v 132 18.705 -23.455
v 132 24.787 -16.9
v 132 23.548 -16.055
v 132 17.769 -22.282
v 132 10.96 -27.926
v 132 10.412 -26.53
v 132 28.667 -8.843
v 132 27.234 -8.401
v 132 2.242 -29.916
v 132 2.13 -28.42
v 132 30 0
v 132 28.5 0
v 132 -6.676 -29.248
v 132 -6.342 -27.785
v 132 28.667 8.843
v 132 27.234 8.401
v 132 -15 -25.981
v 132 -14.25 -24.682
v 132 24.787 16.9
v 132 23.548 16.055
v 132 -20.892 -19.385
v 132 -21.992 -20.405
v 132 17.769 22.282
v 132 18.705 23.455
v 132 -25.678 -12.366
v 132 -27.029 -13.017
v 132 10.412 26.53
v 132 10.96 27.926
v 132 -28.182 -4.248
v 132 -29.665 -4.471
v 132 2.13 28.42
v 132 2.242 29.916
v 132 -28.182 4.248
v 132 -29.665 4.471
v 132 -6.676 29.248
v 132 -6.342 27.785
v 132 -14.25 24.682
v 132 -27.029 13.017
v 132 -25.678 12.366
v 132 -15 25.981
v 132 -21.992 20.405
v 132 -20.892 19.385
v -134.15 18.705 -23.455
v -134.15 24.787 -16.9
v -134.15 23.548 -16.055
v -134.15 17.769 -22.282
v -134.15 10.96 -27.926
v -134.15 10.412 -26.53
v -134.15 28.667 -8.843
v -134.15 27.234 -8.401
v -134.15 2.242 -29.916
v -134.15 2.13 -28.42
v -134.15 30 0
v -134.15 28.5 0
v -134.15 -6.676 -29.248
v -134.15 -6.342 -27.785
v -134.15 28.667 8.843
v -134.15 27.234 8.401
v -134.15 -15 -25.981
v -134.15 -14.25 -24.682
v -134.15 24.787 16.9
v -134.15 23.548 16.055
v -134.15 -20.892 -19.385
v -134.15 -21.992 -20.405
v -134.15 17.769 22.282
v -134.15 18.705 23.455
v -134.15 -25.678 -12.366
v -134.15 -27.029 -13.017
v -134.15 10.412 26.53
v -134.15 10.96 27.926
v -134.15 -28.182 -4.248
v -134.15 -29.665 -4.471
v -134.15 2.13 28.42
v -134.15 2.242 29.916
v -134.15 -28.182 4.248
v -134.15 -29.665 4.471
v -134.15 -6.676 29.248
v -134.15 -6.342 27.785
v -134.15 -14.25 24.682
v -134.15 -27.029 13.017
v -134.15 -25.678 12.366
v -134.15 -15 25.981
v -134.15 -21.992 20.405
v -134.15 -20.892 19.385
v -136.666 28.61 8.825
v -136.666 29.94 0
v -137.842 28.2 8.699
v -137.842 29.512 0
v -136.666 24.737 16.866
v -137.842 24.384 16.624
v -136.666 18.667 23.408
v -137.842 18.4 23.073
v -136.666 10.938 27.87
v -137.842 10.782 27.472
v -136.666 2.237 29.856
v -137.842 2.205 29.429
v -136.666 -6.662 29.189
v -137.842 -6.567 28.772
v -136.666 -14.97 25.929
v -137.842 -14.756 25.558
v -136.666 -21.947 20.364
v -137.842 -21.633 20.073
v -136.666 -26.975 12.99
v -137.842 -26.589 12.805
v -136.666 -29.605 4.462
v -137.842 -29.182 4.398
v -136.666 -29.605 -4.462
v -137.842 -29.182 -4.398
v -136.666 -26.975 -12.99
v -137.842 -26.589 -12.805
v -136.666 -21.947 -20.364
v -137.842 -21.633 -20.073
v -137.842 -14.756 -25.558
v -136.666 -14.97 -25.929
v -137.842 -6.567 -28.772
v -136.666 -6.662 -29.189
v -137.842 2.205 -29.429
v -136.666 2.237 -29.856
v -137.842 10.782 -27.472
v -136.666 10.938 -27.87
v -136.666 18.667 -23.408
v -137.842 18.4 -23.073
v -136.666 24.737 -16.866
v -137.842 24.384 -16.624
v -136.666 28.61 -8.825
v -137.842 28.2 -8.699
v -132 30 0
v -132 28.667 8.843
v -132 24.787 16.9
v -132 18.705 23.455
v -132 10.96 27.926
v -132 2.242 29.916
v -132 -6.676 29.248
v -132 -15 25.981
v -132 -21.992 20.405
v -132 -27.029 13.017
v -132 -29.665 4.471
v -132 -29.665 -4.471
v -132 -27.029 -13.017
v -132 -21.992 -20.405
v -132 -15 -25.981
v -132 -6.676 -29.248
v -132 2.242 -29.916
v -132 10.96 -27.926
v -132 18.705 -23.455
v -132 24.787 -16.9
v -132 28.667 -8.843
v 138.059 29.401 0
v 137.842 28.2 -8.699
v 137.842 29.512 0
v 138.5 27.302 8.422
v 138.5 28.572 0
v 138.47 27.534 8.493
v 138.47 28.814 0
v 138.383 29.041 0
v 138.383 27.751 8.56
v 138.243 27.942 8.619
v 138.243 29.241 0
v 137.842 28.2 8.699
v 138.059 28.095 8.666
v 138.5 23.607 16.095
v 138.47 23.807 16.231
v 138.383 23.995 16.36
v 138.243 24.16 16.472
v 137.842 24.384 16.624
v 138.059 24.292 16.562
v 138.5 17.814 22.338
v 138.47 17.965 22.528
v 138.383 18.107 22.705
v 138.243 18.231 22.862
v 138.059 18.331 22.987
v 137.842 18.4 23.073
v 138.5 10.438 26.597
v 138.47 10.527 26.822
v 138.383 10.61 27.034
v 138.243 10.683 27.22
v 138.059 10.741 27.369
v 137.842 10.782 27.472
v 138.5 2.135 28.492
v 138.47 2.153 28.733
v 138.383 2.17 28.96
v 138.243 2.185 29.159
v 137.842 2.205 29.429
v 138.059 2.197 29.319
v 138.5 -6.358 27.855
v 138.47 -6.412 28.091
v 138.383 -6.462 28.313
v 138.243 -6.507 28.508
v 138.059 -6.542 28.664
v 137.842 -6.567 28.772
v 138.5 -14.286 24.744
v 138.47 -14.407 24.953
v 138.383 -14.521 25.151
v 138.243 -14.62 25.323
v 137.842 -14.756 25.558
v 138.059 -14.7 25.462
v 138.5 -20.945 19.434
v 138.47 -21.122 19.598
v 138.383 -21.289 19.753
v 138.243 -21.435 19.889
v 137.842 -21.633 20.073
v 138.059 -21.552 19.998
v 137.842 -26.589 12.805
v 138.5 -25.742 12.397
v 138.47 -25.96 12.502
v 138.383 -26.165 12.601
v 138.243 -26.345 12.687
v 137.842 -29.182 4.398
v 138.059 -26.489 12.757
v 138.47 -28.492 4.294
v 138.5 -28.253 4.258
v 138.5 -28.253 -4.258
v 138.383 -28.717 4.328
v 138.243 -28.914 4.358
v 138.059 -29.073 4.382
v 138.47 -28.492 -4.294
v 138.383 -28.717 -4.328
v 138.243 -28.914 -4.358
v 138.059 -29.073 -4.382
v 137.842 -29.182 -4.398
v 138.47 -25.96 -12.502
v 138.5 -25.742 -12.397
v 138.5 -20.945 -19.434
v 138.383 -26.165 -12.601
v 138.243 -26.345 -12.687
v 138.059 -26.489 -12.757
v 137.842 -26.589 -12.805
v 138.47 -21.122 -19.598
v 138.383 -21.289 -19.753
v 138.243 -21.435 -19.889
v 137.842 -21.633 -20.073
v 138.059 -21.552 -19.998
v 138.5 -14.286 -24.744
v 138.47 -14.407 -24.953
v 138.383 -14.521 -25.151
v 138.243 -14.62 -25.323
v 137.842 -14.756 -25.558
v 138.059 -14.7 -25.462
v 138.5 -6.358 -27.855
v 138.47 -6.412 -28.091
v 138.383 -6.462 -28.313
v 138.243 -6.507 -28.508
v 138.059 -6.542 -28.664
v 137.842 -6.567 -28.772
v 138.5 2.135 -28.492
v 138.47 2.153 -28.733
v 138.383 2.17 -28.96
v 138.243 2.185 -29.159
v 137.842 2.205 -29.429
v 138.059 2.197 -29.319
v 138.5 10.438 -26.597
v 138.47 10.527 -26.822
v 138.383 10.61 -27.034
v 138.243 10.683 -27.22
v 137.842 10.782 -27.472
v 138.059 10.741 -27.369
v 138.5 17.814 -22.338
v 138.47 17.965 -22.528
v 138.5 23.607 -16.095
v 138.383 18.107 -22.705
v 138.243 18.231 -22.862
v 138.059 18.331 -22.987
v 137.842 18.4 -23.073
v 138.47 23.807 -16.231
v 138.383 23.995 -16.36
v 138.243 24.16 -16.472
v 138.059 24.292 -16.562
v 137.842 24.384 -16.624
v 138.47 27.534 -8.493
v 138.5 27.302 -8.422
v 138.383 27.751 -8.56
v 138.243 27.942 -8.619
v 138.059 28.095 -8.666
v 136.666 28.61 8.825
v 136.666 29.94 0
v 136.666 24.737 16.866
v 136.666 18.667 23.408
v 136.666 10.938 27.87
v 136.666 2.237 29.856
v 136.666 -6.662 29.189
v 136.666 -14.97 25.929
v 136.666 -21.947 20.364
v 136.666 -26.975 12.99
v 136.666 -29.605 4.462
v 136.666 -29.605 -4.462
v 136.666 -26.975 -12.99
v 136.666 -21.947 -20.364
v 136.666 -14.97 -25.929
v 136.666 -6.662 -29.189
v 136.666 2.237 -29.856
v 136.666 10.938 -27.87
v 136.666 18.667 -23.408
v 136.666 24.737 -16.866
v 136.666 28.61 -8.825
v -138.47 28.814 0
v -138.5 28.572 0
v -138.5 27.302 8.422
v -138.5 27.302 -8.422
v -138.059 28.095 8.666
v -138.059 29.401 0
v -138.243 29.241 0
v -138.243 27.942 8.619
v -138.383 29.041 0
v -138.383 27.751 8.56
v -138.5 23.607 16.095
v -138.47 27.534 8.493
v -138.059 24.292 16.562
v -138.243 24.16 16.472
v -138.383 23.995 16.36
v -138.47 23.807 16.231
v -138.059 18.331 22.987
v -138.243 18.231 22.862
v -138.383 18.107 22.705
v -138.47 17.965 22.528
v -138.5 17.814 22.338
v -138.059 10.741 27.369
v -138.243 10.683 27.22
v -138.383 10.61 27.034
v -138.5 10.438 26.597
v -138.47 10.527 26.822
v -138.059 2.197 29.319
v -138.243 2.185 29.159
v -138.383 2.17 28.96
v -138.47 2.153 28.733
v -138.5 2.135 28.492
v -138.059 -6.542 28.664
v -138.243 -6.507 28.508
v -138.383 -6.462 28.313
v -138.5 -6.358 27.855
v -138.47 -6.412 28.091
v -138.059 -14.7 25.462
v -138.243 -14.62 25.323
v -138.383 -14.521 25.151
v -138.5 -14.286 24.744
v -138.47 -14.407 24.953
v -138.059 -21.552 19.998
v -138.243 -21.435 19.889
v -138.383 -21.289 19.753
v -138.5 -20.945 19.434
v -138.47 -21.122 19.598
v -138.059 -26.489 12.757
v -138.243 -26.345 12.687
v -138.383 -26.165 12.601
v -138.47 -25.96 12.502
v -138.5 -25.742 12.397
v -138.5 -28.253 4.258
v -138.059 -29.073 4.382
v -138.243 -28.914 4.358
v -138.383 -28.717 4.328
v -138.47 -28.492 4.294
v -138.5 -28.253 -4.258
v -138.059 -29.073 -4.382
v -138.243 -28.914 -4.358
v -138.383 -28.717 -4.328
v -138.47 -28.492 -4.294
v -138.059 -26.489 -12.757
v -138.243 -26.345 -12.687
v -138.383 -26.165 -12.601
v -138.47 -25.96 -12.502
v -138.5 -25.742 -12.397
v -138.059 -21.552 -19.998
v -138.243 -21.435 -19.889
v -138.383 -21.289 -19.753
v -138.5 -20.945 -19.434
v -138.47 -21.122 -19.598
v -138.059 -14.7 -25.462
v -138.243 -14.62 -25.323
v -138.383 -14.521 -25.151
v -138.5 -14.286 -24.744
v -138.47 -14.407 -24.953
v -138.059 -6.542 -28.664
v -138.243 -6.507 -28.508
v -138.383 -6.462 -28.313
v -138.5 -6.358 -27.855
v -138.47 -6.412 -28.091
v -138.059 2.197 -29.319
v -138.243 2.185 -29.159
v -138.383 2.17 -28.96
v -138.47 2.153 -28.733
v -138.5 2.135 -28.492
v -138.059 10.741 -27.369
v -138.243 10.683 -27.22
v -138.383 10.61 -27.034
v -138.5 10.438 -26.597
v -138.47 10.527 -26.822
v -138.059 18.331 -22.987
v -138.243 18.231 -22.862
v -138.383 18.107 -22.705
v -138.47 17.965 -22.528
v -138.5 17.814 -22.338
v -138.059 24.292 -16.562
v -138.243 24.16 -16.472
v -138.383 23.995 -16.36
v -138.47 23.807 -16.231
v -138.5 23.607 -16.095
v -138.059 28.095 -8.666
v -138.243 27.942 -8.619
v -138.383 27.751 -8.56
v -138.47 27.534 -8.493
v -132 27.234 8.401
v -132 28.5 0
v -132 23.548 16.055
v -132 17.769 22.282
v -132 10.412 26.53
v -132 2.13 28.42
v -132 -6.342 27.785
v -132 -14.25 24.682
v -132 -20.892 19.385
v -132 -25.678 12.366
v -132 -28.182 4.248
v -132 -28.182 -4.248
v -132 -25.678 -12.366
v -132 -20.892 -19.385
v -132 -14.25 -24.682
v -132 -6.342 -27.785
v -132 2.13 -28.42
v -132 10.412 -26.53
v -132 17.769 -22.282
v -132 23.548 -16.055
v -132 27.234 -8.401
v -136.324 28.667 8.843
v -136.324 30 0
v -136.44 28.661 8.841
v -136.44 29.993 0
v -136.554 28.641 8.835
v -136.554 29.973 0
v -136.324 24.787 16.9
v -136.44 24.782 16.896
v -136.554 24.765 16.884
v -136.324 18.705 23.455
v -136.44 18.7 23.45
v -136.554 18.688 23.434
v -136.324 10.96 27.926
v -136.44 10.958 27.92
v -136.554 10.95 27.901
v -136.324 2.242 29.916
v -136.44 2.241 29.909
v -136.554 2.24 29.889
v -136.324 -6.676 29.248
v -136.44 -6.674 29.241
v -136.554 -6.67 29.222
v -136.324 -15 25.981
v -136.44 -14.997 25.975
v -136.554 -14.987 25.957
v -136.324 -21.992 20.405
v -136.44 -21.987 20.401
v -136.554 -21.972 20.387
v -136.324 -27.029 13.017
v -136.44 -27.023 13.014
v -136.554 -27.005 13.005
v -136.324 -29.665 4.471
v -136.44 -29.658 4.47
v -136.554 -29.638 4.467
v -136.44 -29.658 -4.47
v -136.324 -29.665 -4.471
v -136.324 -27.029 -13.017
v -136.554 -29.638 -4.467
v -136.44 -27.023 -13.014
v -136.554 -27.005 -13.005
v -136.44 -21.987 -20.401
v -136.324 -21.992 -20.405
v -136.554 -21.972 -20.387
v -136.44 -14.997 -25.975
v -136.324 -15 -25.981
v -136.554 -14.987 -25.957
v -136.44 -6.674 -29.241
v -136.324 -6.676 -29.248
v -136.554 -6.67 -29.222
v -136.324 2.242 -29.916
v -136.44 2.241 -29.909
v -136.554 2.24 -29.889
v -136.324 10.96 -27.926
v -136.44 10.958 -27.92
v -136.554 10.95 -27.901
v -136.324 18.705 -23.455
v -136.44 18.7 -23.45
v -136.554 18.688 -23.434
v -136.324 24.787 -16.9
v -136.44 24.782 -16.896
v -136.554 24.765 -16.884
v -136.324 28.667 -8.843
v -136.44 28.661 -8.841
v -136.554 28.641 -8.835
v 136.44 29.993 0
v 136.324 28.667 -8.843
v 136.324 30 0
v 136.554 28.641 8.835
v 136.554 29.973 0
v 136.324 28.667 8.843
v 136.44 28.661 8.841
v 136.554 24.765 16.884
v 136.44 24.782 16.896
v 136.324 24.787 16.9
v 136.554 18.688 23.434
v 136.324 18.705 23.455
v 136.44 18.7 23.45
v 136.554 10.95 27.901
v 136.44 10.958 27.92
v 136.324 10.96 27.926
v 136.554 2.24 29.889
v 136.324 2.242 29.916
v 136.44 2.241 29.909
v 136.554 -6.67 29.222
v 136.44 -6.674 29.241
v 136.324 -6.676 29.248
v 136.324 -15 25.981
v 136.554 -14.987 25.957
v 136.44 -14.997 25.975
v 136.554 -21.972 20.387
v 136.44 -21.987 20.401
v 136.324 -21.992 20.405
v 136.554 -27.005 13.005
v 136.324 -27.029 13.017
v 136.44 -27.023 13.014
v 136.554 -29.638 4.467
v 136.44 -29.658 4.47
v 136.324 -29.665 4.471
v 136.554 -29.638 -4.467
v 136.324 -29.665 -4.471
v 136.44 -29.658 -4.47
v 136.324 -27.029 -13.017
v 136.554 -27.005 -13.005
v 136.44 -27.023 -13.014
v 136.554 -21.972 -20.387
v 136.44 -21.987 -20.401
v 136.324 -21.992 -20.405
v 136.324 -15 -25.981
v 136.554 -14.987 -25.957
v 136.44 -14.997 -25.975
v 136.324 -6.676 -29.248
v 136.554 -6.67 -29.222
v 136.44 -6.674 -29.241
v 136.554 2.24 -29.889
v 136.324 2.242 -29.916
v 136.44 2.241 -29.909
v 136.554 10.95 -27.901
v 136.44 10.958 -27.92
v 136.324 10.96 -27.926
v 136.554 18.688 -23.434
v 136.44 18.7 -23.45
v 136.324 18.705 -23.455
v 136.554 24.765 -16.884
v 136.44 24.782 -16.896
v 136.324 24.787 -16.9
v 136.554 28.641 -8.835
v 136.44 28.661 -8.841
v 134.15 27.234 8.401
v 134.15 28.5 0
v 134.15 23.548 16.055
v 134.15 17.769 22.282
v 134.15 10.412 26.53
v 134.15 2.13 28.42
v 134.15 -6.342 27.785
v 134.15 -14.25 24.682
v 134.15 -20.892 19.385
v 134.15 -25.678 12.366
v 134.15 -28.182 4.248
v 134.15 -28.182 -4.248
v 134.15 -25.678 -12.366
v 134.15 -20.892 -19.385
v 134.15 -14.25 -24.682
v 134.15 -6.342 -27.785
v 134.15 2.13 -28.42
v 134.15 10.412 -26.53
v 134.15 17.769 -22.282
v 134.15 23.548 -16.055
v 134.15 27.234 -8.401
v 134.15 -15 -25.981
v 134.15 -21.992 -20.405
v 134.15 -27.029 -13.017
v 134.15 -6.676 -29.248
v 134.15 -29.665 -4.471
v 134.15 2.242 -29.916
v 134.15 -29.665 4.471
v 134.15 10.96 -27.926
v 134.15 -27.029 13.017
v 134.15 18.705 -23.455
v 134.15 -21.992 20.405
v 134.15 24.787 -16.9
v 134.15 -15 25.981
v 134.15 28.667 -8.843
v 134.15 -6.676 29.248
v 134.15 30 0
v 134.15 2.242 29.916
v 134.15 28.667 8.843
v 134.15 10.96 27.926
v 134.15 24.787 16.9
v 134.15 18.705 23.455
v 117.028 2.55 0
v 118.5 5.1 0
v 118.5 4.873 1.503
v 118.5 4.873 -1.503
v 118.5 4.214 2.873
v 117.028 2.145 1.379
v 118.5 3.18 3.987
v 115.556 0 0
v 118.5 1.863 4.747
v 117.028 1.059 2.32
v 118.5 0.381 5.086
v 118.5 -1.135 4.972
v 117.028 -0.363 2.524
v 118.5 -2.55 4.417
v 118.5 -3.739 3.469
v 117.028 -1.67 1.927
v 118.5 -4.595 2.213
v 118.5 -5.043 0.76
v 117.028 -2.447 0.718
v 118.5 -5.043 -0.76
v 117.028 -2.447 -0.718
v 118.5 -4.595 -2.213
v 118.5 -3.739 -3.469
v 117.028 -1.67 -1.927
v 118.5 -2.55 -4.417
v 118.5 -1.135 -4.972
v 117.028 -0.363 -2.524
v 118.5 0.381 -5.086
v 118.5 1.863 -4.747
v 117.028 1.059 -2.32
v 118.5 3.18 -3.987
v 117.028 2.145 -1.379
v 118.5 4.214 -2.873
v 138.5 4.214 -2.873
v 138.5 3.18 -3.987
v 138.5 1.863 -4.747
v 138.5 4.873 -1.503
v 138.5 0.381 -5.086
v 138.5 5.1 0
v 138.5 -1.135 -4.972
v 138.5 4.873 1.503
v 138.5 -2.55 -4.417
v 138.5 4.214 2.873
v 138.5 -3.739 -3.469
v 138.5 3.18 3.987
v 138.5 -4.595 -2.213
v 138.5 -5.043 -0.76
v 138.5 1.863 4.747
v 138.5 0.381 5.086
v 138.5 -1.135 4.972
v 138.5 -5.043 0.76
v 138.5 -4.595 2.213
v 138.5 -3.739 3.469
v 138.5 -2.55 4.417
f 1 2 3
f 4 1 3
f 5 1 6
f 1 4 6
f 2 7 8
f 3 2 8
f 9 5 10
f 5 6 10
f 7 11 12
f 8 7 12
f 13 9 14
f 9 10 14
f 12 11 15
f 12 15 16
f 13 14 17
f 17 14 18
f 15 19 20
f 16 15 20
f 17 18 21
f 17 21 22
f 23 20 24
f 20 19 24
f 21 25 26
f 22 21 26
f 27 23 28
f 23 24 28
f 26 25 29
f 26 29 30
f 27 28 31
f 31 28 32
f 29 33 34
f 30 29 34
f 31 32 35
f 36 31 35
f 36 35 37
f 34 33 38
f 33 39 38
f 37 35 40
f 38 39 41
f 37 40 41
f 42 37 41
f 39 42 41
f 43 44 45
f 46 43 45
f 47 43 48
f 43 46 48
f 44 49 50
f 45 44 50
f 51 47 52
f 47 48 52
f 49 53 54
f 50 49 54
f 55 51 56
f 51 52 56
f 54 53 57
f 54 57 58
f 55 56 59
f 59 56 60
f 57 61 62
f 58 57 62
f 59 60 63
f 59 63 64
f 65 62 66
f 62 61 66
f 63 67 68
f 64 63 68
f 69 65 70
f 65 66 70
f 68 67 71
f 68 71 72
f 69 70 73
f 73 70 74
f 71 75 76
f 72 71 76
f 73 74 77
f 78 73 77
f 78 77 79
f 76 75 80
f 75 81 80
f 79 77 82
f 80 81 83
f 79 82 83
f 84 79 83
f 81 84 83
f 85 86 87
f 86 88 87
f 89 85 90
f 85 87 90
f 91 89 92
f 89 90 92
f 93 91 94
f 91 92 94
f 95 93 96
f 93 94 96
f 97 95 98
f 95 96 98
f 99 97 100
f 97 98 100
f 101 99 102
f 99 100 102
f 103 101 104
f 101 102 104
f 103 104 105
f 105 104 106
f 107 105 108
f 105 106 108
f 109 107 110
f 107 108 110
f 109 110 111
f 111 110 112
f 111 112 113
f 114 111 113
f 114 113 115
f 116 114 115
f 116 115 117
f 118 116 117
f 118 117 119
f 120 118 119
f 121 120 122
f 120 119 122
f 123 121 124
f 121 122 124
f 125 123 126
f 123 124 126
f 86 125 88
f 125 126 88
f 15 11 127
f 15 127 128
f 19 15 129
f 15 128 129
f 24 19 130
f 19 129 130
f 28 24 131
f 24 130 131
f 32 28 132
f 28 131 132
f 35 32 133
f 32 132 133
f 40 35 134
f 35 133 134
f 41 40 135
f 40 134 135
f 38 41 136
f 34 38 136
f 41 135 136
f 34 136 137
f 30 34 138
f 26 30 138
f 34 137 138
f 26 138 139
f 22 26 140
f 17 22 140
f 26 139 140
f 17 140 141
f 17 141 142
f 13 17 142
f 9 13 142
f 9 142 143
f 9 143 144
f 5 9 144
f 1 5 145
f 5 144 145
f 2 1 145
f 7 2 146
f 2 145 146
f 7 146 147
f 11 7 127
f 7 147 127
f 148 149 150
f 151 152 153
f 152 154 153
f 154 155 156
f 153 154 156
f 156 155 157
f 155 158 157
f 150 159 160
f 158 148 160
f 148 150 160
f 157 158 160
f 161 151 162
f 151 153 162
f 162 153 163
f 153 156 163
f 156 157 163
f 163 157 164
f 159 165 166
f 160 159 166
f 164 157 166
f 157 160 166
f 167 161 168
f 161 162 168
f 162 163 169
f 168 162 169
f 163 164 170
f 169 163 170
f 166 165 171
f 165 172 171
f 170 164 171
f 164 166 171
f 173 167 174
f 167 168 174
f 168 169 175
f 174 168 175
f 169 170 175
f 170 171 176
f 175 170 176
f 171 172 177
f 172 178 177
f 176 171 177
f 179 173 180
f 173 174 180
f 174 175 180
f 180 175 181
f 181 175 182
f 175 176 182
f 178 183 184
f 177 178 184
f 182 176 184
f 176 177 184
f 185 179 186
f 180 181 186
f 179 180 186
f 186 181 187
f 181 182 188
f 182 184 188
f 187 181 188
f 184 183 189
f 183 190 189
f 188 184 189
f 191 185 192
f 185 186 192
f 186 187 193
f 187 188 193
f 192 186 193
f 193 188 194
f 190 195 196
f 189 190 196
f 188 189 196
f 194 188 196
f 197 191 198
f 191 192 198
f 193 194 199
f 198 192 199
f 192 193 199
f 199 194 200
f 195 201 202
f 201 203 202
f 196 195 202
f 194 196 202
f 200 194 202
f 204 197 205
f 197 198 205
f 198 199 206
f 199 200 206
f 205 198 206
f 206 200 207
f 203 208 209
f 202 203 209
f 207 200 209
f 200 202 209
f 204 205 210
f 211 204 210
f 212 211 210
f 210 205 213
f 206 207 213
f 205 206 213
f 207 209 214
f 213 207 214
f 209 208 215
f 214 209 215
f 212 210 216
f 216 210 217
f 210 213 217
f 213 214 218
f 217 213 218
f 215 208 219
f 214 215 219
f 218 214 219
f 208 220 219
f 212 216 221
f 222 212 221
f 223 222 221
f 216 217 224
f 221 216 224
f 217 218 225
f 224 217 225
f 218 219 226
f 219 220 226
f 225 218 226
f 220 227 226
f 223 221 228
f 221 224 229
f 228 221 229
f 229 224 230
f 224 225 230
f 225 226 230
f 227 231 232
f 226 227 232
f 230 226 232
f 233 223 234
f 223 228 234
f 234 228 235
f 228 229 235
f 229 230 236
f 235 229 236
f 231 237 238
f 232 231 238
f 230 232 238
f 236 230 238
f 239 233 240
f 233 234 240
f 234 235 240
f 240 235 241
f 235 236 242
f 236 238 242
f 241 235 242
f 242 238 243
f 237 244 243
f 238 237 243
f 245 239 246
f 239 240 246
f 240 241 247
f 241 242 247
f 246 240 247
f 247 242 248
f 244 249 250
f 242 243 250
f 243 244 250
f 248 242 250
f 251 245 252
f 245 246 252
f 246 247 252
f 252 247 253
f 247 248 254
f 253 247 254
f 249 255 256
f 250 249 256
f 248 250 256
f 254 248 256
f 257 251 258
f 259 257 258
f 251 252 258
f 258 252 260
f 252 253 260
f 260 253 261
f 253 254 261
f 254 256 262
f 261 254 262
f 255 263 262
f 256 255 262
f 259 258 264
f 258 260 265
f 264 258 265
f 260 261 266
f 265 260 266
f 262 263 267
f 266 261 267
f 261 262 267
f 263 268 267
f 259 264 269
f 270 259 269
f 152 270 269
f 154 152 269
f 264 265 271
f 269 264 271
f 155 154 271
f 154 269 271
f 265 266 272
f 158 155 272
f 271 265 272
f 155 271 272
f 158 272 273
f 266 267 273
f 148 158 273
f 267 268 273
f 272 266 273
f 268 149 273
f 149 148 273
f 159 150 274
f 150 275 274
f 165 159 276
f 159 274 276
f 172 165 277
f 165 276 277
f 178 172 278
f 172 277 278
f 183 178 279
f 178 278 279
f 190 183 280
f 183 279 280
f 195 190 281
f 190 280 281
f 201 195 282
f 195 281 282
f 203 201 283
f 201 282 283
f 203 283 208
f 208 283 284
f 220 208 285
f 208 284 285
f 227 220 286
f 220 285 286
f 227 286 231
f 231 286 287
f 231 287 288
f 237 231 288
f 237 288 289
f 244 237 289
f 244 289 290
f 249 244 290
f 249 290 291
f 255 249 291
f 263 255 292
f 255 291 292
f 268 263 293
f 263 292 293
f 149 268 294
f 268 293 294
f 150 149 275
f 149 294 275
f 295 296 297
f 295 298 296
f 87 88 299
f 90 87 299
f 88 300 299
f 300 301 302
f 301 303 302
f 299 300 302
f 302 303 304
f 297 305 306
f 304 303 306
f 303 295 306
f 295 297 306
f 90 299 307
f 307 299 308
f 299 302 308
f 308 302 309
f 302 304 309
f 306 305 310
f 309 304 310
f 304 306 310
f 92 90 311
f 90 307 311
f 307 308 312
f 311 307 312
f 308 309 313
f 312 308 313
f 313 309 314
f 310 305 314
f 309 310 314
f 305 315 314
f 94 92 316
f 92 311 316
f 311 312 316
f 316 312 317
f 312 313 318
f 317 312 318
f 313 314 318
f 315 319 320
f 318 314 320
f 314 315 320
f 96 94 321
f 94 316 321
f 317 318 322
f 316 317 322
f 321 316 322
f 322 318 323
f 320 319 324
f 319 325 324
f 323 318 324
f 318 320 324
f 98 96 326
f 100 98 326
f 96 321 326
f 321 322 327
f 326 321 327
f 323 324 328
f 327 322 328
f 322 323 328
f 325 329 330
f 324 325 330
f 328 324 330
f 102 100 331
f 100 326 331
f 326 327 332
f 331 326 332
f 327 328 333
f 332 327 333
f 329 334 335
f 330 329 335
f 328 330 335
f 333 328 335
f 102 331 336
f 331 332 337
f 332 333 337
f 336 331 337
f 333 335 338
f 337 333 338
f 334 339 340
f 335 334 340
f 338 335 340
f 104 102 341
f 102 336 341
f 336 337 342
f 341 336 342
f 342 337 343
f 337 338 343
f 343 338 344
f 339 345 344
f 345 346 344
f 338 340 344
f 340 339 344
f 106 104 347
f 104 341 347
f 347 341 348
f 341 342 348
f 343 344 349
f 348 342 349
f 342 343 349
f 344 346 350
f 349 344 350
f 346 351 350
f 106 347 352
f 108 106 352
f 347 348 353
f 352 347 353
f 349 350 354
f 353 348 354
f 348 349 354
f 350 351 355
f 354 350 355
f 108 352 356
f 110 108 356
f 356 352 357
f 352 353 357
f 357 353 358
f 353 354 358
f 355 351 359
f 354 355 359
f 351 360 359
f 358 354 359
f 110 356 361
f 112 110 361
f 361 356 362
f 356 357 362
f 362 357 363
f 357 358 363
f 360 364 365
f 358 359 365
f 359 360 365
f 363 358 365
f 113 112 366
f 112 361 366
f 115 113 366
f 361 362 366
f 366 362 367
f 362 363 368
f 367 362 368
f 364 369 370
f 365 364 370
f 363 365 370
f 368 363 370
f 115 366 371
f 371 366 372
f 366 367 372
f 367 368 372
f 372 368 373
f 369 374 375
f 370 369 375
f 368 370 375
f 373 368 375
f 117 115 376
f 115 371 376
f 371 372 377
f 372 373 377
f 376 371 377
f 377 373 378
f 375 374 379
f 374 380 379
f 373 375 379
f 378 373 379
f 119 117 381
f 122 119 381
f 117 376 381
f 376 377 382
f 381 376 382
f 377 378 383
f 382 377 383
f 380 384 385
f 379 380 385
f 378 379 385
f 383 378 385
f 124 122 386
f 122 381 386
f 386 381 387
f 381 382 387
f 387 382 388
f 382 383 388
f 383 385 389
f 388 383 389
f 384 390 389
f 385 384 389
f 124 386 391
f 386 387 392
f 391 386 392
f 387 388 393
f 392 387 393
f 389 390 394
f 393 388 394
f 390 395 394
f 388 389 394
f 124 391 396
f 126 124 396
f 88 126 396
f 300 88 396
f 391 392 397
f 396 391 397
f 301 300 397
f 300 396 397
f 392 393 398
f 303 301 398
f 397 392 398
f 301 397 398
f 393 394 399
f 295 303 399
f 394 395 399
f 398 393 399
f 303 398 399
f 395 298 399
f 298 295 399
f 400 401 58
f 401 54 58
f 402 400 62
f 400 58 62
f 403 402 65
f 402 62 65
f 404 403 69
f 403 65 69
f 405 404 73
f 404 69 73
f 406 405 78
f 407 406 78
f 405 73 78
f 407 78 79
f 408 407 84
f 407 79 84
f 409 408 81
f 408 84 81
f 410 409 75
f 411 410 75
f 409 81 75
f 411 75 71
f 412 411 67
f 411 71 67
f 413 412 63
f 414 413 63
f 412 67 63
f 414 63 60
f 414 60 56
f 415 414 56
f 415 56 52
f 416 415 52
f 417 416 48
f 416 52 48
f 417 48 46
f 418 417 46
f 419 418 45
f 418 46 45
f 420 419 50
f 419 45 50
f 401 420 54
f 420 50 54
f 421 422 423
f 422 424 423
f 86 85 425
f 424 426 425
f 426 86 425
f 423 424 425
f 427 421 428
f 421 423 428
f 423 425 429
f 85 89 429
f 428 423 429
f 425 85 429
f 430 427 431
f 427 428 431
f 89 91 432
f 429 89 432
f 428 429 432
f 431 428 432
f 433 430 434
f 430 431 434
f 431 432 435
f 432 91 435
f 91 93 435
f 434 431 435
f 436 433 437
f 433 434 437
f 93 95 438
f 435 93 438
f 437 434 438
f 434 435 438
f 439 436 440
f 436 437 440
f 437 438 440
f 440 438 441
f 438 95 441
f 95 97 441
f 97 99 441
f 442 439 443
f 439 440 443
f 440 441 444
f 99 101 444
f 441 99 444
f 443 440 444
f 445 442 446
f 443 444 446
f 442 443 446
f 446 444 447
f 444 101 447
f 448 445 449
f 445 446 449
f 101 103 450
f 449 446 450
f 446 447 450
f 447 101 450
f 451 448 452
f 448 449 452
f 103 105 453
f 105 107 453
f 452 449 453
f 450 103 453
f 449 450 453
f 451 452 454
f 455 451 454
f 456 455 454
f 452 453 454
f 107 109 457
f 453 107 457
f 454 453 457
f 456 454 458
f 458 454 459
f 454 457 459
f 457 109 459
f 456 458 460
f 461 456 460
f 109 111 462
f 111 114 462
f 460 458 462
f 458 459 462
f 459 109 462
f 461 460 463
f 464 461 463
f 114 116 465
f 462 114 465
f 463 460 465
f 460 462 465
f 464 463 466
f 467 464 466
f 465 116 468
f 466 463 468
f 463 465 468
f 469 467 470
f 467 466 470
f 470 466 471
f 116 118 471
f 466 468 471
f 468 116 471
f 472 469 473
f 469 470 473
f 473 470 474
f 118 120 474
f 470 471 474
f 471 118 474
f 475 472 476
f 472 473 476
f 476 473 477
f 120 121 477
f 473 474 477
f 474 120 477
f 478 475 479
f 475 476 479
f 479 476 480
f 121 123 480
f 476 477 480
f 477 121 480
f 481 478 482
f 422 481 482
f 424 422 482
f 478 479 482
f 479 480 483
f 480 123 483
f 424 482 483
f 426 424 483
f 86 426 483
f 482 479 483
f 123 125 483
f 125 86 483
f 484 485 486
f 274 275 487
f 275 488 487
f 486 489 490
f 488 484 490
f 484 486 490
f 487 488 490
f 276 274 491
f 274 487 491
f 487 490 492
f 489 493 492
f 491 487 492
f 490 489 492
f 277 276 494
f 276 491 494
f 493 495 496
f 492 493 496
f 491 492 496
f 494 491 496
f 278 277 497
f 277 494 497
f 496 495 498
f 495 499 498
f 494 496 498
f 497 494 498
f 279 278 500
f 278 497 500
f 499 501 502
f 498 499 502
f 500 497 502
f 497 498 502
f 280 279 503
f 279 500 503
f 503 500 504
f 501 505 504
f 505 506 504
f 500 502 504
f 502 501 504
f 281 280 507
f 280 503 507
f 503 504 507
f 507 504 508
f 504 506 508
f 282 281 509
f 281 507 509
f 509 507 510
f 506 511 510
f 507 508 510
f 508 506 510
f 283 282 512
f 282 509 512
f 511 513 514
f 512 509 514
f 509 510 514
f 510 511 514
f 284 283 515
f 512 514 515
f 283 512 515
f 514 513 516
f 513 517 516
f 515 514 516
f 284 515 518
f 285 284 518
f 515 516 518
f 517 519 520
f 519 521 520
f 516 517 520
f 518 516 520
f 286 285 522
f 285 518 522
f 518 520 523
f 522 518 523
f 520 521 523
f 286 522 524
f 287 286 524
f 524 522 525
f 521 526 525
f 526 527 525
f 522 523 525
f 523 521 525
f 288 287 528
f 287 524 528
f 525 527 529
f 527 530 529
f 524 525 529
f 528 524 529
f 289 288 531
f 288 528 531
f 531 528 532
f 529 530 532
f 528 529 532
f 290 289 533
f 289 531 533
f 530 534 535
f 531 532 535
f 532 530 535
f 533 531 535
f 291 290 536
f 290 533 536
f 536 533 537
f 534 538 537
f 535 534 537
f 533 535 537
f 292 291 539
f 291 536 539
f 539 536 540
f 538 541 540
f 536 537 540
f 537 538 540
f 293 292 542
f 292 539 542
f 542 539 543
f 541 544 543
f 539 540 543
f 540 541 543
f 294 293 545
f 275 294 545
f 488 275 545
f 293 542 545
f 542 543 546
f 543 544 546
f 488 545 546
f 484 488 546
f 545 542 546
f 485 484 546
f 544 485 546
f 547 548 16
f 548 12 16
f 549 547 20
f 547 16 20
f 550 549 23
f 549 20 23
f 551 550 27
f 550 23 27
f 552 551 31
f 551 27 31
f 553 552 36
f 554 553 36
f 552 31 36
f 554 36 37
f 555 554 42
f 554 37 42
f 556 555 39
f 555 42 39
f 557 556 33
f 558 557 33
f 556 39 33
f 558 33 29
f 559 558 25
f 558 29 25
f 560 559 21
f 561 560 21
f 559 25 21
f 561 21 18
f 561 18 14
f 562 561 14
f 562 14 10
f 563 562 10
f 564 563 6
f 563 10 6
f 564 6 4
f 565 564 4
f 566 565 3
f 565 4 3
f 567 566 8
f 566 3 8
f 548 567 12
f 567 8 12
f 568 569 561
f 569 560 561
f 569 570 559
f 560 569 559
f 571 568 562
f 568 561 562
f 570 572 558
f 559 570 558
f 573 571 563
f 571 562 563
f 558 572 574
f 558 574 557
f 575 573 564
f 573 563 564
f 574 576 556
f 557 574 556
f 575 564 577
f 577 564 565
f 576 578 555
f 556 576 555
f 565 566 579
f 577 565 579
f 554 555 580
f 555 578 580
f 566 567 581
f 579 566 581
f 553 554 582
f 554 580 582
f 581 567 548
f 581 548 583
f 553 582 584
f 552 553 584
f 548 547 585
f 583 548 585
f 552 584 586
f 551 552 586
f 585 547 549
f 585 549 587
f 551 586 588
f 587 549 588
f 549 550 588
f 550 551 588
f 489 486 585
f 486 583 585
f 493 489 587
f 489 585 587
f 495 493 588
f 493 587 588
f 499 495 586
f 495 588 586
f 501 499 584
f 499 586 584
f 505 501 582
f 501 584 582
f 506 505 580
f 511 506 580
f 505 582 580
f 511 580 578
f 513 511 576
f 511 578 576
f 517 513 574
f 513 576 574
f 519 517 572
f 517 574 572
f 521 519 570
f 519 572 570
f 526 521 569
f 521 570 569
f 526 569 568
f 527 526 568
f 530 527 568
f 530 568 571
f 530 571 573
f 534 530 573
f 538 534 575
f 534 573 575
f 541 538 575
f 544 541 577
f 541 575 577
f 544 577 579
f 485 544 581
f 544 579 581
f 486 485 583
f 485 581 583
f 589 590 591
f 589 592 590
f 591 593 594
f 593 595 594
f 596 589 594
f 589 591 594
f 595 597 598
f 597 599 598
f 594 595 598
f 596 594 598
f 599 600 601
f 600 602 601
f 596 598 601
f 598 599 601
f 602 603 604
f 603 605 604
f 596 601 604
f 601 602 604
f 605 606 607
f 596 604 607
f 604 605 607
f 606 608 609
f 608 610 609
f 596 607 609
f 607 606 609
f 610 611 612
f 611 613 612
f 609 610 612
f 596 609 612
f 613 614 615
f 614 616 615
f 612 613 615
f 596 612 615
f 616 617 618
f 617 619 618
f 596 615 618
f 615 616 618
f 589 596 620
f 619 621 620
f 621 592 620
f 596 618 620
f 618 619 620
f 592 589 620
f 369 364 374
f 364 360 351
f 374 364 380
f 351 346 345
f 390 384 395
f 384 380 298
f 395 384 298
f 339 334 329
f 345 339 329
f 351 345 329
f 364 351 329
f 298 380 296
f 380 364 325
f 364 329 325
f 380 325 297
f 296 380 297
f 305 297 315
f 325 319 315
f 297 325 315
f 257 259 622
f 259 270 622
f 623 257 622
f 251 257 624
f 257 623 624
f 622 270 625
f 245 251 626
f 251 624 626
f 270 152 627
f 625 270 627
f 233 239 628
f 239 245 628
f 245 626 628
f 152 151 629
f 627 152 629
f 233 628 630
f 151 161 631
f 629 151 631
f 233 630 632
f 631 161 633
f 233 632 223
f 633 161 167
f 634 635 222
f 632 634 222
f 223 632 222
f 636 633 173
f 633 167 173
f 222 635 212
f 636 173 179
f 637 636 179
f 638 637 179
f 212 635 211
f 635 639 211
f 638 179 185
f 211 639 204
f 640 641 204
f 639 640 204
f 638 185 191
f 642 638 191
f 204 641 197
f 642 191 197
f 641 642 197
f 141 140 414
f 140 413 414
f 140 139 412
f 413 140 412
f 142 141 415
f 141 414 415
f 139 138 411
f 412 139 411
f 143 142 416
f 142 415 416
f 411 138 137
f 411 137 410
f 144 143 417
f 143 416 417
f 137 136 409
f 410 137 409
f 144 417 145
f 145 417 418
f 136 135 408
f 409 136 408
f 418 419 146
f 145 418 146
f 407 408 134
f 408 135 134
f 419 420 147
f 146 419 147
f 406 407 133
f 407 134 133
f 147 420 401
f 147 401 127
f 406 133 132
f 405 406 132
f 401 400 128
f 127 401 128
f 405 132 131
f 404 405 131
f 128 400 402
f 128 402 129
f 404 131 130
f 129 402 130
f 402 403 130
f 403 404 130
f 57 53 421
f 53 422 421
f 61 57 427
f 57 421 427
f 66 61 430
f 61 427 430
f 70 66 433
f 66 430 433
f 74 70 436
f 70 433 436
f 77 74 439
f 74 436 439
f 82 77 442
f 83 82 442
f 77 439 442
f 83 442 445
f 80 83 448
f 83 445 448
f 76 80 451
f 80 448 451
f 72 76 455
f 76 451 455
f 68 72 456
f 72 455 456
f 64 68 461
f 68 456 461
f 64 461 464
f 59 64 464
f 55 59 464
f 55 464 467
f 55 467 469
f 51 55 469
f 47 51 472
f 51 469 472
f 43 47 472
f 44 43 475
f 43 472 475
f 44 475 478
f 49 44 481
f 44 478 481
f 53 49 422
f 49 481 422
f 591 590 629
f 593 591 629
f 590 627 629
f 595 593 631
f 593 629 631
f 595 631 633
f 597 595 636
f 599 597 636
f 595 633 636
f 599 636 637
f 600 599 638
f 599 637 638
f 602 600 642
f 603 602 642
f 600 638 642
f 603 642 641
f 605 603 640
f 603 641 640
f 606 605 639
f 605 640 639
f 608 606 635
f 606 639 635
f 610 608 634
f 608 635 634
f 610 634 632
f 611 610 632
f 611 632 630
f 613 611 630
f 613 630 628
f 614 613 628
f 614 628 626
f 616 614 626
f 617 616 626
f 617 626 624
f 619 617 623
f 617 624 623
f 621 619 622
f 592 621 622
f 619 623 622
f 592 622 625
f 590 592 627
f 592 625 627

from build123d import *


with BuildPart() as part:
    # Sketch1 → Base-Revolve (revolve)
    with BuildSketch(Plane.XY):
        with BuildLine():
            Line((132, 30), (0, 30))
            Line((0, 30), (-132, 30))
            Line((-132, 30), (-132, 28.5))
            Line((-132, 28.5), (-134.15, 28.5))
            Line((-134.15, 28.5), (-134.15, 30))
            Line((-134.15, 30), (-136.323673019, 30))
            ThreePointArc((-136.323673019, 30), (-136.497321197, 29.984807753), (-136.665693163, 29.939692621))
            Line((-136.665693163, 29.939692621), (-137.842020143, 29.511544614))
            ThreePointArc((-137.842020143, 29.511544614), (-138.319152044, 29.14542843), (-138.5, 28.571851993))
            Line((-138.5, 28.571851993), (-138.5, 0))
            Line((-138.5, 0), (115.555513627, 0))
            Line((115.555513627, 0), (118.5, 5.1))
            Line((118.5, 5.1), (138.5, 5.1))
            Line((138.5, 5.1), (138.5, 28.571851993))
            ThreePointArc((138.5, 28.571851993), (138.319152044, 29.14542843), (137.842020143, 29.511544614))
            Line((137.842020143, 29.511544614), (136.665693163, 29.939692621))
            ThreePointArc((136.665693163, 29.939692621), (136.497321197, 29.984807753), (136.323673019, 30))
            Line((136.323673019, 30), (134.15, 30))
            Line((134.15, 30), (134.15, 28.5))
            Line((134.15, 28.5), (132, 28.5))
            Line((132, 28.5), (132, 30))
        make_face()
    revolve(axis=Axis((-138.5, 0, 0), (1, 0, 0)))


solid = part.part
